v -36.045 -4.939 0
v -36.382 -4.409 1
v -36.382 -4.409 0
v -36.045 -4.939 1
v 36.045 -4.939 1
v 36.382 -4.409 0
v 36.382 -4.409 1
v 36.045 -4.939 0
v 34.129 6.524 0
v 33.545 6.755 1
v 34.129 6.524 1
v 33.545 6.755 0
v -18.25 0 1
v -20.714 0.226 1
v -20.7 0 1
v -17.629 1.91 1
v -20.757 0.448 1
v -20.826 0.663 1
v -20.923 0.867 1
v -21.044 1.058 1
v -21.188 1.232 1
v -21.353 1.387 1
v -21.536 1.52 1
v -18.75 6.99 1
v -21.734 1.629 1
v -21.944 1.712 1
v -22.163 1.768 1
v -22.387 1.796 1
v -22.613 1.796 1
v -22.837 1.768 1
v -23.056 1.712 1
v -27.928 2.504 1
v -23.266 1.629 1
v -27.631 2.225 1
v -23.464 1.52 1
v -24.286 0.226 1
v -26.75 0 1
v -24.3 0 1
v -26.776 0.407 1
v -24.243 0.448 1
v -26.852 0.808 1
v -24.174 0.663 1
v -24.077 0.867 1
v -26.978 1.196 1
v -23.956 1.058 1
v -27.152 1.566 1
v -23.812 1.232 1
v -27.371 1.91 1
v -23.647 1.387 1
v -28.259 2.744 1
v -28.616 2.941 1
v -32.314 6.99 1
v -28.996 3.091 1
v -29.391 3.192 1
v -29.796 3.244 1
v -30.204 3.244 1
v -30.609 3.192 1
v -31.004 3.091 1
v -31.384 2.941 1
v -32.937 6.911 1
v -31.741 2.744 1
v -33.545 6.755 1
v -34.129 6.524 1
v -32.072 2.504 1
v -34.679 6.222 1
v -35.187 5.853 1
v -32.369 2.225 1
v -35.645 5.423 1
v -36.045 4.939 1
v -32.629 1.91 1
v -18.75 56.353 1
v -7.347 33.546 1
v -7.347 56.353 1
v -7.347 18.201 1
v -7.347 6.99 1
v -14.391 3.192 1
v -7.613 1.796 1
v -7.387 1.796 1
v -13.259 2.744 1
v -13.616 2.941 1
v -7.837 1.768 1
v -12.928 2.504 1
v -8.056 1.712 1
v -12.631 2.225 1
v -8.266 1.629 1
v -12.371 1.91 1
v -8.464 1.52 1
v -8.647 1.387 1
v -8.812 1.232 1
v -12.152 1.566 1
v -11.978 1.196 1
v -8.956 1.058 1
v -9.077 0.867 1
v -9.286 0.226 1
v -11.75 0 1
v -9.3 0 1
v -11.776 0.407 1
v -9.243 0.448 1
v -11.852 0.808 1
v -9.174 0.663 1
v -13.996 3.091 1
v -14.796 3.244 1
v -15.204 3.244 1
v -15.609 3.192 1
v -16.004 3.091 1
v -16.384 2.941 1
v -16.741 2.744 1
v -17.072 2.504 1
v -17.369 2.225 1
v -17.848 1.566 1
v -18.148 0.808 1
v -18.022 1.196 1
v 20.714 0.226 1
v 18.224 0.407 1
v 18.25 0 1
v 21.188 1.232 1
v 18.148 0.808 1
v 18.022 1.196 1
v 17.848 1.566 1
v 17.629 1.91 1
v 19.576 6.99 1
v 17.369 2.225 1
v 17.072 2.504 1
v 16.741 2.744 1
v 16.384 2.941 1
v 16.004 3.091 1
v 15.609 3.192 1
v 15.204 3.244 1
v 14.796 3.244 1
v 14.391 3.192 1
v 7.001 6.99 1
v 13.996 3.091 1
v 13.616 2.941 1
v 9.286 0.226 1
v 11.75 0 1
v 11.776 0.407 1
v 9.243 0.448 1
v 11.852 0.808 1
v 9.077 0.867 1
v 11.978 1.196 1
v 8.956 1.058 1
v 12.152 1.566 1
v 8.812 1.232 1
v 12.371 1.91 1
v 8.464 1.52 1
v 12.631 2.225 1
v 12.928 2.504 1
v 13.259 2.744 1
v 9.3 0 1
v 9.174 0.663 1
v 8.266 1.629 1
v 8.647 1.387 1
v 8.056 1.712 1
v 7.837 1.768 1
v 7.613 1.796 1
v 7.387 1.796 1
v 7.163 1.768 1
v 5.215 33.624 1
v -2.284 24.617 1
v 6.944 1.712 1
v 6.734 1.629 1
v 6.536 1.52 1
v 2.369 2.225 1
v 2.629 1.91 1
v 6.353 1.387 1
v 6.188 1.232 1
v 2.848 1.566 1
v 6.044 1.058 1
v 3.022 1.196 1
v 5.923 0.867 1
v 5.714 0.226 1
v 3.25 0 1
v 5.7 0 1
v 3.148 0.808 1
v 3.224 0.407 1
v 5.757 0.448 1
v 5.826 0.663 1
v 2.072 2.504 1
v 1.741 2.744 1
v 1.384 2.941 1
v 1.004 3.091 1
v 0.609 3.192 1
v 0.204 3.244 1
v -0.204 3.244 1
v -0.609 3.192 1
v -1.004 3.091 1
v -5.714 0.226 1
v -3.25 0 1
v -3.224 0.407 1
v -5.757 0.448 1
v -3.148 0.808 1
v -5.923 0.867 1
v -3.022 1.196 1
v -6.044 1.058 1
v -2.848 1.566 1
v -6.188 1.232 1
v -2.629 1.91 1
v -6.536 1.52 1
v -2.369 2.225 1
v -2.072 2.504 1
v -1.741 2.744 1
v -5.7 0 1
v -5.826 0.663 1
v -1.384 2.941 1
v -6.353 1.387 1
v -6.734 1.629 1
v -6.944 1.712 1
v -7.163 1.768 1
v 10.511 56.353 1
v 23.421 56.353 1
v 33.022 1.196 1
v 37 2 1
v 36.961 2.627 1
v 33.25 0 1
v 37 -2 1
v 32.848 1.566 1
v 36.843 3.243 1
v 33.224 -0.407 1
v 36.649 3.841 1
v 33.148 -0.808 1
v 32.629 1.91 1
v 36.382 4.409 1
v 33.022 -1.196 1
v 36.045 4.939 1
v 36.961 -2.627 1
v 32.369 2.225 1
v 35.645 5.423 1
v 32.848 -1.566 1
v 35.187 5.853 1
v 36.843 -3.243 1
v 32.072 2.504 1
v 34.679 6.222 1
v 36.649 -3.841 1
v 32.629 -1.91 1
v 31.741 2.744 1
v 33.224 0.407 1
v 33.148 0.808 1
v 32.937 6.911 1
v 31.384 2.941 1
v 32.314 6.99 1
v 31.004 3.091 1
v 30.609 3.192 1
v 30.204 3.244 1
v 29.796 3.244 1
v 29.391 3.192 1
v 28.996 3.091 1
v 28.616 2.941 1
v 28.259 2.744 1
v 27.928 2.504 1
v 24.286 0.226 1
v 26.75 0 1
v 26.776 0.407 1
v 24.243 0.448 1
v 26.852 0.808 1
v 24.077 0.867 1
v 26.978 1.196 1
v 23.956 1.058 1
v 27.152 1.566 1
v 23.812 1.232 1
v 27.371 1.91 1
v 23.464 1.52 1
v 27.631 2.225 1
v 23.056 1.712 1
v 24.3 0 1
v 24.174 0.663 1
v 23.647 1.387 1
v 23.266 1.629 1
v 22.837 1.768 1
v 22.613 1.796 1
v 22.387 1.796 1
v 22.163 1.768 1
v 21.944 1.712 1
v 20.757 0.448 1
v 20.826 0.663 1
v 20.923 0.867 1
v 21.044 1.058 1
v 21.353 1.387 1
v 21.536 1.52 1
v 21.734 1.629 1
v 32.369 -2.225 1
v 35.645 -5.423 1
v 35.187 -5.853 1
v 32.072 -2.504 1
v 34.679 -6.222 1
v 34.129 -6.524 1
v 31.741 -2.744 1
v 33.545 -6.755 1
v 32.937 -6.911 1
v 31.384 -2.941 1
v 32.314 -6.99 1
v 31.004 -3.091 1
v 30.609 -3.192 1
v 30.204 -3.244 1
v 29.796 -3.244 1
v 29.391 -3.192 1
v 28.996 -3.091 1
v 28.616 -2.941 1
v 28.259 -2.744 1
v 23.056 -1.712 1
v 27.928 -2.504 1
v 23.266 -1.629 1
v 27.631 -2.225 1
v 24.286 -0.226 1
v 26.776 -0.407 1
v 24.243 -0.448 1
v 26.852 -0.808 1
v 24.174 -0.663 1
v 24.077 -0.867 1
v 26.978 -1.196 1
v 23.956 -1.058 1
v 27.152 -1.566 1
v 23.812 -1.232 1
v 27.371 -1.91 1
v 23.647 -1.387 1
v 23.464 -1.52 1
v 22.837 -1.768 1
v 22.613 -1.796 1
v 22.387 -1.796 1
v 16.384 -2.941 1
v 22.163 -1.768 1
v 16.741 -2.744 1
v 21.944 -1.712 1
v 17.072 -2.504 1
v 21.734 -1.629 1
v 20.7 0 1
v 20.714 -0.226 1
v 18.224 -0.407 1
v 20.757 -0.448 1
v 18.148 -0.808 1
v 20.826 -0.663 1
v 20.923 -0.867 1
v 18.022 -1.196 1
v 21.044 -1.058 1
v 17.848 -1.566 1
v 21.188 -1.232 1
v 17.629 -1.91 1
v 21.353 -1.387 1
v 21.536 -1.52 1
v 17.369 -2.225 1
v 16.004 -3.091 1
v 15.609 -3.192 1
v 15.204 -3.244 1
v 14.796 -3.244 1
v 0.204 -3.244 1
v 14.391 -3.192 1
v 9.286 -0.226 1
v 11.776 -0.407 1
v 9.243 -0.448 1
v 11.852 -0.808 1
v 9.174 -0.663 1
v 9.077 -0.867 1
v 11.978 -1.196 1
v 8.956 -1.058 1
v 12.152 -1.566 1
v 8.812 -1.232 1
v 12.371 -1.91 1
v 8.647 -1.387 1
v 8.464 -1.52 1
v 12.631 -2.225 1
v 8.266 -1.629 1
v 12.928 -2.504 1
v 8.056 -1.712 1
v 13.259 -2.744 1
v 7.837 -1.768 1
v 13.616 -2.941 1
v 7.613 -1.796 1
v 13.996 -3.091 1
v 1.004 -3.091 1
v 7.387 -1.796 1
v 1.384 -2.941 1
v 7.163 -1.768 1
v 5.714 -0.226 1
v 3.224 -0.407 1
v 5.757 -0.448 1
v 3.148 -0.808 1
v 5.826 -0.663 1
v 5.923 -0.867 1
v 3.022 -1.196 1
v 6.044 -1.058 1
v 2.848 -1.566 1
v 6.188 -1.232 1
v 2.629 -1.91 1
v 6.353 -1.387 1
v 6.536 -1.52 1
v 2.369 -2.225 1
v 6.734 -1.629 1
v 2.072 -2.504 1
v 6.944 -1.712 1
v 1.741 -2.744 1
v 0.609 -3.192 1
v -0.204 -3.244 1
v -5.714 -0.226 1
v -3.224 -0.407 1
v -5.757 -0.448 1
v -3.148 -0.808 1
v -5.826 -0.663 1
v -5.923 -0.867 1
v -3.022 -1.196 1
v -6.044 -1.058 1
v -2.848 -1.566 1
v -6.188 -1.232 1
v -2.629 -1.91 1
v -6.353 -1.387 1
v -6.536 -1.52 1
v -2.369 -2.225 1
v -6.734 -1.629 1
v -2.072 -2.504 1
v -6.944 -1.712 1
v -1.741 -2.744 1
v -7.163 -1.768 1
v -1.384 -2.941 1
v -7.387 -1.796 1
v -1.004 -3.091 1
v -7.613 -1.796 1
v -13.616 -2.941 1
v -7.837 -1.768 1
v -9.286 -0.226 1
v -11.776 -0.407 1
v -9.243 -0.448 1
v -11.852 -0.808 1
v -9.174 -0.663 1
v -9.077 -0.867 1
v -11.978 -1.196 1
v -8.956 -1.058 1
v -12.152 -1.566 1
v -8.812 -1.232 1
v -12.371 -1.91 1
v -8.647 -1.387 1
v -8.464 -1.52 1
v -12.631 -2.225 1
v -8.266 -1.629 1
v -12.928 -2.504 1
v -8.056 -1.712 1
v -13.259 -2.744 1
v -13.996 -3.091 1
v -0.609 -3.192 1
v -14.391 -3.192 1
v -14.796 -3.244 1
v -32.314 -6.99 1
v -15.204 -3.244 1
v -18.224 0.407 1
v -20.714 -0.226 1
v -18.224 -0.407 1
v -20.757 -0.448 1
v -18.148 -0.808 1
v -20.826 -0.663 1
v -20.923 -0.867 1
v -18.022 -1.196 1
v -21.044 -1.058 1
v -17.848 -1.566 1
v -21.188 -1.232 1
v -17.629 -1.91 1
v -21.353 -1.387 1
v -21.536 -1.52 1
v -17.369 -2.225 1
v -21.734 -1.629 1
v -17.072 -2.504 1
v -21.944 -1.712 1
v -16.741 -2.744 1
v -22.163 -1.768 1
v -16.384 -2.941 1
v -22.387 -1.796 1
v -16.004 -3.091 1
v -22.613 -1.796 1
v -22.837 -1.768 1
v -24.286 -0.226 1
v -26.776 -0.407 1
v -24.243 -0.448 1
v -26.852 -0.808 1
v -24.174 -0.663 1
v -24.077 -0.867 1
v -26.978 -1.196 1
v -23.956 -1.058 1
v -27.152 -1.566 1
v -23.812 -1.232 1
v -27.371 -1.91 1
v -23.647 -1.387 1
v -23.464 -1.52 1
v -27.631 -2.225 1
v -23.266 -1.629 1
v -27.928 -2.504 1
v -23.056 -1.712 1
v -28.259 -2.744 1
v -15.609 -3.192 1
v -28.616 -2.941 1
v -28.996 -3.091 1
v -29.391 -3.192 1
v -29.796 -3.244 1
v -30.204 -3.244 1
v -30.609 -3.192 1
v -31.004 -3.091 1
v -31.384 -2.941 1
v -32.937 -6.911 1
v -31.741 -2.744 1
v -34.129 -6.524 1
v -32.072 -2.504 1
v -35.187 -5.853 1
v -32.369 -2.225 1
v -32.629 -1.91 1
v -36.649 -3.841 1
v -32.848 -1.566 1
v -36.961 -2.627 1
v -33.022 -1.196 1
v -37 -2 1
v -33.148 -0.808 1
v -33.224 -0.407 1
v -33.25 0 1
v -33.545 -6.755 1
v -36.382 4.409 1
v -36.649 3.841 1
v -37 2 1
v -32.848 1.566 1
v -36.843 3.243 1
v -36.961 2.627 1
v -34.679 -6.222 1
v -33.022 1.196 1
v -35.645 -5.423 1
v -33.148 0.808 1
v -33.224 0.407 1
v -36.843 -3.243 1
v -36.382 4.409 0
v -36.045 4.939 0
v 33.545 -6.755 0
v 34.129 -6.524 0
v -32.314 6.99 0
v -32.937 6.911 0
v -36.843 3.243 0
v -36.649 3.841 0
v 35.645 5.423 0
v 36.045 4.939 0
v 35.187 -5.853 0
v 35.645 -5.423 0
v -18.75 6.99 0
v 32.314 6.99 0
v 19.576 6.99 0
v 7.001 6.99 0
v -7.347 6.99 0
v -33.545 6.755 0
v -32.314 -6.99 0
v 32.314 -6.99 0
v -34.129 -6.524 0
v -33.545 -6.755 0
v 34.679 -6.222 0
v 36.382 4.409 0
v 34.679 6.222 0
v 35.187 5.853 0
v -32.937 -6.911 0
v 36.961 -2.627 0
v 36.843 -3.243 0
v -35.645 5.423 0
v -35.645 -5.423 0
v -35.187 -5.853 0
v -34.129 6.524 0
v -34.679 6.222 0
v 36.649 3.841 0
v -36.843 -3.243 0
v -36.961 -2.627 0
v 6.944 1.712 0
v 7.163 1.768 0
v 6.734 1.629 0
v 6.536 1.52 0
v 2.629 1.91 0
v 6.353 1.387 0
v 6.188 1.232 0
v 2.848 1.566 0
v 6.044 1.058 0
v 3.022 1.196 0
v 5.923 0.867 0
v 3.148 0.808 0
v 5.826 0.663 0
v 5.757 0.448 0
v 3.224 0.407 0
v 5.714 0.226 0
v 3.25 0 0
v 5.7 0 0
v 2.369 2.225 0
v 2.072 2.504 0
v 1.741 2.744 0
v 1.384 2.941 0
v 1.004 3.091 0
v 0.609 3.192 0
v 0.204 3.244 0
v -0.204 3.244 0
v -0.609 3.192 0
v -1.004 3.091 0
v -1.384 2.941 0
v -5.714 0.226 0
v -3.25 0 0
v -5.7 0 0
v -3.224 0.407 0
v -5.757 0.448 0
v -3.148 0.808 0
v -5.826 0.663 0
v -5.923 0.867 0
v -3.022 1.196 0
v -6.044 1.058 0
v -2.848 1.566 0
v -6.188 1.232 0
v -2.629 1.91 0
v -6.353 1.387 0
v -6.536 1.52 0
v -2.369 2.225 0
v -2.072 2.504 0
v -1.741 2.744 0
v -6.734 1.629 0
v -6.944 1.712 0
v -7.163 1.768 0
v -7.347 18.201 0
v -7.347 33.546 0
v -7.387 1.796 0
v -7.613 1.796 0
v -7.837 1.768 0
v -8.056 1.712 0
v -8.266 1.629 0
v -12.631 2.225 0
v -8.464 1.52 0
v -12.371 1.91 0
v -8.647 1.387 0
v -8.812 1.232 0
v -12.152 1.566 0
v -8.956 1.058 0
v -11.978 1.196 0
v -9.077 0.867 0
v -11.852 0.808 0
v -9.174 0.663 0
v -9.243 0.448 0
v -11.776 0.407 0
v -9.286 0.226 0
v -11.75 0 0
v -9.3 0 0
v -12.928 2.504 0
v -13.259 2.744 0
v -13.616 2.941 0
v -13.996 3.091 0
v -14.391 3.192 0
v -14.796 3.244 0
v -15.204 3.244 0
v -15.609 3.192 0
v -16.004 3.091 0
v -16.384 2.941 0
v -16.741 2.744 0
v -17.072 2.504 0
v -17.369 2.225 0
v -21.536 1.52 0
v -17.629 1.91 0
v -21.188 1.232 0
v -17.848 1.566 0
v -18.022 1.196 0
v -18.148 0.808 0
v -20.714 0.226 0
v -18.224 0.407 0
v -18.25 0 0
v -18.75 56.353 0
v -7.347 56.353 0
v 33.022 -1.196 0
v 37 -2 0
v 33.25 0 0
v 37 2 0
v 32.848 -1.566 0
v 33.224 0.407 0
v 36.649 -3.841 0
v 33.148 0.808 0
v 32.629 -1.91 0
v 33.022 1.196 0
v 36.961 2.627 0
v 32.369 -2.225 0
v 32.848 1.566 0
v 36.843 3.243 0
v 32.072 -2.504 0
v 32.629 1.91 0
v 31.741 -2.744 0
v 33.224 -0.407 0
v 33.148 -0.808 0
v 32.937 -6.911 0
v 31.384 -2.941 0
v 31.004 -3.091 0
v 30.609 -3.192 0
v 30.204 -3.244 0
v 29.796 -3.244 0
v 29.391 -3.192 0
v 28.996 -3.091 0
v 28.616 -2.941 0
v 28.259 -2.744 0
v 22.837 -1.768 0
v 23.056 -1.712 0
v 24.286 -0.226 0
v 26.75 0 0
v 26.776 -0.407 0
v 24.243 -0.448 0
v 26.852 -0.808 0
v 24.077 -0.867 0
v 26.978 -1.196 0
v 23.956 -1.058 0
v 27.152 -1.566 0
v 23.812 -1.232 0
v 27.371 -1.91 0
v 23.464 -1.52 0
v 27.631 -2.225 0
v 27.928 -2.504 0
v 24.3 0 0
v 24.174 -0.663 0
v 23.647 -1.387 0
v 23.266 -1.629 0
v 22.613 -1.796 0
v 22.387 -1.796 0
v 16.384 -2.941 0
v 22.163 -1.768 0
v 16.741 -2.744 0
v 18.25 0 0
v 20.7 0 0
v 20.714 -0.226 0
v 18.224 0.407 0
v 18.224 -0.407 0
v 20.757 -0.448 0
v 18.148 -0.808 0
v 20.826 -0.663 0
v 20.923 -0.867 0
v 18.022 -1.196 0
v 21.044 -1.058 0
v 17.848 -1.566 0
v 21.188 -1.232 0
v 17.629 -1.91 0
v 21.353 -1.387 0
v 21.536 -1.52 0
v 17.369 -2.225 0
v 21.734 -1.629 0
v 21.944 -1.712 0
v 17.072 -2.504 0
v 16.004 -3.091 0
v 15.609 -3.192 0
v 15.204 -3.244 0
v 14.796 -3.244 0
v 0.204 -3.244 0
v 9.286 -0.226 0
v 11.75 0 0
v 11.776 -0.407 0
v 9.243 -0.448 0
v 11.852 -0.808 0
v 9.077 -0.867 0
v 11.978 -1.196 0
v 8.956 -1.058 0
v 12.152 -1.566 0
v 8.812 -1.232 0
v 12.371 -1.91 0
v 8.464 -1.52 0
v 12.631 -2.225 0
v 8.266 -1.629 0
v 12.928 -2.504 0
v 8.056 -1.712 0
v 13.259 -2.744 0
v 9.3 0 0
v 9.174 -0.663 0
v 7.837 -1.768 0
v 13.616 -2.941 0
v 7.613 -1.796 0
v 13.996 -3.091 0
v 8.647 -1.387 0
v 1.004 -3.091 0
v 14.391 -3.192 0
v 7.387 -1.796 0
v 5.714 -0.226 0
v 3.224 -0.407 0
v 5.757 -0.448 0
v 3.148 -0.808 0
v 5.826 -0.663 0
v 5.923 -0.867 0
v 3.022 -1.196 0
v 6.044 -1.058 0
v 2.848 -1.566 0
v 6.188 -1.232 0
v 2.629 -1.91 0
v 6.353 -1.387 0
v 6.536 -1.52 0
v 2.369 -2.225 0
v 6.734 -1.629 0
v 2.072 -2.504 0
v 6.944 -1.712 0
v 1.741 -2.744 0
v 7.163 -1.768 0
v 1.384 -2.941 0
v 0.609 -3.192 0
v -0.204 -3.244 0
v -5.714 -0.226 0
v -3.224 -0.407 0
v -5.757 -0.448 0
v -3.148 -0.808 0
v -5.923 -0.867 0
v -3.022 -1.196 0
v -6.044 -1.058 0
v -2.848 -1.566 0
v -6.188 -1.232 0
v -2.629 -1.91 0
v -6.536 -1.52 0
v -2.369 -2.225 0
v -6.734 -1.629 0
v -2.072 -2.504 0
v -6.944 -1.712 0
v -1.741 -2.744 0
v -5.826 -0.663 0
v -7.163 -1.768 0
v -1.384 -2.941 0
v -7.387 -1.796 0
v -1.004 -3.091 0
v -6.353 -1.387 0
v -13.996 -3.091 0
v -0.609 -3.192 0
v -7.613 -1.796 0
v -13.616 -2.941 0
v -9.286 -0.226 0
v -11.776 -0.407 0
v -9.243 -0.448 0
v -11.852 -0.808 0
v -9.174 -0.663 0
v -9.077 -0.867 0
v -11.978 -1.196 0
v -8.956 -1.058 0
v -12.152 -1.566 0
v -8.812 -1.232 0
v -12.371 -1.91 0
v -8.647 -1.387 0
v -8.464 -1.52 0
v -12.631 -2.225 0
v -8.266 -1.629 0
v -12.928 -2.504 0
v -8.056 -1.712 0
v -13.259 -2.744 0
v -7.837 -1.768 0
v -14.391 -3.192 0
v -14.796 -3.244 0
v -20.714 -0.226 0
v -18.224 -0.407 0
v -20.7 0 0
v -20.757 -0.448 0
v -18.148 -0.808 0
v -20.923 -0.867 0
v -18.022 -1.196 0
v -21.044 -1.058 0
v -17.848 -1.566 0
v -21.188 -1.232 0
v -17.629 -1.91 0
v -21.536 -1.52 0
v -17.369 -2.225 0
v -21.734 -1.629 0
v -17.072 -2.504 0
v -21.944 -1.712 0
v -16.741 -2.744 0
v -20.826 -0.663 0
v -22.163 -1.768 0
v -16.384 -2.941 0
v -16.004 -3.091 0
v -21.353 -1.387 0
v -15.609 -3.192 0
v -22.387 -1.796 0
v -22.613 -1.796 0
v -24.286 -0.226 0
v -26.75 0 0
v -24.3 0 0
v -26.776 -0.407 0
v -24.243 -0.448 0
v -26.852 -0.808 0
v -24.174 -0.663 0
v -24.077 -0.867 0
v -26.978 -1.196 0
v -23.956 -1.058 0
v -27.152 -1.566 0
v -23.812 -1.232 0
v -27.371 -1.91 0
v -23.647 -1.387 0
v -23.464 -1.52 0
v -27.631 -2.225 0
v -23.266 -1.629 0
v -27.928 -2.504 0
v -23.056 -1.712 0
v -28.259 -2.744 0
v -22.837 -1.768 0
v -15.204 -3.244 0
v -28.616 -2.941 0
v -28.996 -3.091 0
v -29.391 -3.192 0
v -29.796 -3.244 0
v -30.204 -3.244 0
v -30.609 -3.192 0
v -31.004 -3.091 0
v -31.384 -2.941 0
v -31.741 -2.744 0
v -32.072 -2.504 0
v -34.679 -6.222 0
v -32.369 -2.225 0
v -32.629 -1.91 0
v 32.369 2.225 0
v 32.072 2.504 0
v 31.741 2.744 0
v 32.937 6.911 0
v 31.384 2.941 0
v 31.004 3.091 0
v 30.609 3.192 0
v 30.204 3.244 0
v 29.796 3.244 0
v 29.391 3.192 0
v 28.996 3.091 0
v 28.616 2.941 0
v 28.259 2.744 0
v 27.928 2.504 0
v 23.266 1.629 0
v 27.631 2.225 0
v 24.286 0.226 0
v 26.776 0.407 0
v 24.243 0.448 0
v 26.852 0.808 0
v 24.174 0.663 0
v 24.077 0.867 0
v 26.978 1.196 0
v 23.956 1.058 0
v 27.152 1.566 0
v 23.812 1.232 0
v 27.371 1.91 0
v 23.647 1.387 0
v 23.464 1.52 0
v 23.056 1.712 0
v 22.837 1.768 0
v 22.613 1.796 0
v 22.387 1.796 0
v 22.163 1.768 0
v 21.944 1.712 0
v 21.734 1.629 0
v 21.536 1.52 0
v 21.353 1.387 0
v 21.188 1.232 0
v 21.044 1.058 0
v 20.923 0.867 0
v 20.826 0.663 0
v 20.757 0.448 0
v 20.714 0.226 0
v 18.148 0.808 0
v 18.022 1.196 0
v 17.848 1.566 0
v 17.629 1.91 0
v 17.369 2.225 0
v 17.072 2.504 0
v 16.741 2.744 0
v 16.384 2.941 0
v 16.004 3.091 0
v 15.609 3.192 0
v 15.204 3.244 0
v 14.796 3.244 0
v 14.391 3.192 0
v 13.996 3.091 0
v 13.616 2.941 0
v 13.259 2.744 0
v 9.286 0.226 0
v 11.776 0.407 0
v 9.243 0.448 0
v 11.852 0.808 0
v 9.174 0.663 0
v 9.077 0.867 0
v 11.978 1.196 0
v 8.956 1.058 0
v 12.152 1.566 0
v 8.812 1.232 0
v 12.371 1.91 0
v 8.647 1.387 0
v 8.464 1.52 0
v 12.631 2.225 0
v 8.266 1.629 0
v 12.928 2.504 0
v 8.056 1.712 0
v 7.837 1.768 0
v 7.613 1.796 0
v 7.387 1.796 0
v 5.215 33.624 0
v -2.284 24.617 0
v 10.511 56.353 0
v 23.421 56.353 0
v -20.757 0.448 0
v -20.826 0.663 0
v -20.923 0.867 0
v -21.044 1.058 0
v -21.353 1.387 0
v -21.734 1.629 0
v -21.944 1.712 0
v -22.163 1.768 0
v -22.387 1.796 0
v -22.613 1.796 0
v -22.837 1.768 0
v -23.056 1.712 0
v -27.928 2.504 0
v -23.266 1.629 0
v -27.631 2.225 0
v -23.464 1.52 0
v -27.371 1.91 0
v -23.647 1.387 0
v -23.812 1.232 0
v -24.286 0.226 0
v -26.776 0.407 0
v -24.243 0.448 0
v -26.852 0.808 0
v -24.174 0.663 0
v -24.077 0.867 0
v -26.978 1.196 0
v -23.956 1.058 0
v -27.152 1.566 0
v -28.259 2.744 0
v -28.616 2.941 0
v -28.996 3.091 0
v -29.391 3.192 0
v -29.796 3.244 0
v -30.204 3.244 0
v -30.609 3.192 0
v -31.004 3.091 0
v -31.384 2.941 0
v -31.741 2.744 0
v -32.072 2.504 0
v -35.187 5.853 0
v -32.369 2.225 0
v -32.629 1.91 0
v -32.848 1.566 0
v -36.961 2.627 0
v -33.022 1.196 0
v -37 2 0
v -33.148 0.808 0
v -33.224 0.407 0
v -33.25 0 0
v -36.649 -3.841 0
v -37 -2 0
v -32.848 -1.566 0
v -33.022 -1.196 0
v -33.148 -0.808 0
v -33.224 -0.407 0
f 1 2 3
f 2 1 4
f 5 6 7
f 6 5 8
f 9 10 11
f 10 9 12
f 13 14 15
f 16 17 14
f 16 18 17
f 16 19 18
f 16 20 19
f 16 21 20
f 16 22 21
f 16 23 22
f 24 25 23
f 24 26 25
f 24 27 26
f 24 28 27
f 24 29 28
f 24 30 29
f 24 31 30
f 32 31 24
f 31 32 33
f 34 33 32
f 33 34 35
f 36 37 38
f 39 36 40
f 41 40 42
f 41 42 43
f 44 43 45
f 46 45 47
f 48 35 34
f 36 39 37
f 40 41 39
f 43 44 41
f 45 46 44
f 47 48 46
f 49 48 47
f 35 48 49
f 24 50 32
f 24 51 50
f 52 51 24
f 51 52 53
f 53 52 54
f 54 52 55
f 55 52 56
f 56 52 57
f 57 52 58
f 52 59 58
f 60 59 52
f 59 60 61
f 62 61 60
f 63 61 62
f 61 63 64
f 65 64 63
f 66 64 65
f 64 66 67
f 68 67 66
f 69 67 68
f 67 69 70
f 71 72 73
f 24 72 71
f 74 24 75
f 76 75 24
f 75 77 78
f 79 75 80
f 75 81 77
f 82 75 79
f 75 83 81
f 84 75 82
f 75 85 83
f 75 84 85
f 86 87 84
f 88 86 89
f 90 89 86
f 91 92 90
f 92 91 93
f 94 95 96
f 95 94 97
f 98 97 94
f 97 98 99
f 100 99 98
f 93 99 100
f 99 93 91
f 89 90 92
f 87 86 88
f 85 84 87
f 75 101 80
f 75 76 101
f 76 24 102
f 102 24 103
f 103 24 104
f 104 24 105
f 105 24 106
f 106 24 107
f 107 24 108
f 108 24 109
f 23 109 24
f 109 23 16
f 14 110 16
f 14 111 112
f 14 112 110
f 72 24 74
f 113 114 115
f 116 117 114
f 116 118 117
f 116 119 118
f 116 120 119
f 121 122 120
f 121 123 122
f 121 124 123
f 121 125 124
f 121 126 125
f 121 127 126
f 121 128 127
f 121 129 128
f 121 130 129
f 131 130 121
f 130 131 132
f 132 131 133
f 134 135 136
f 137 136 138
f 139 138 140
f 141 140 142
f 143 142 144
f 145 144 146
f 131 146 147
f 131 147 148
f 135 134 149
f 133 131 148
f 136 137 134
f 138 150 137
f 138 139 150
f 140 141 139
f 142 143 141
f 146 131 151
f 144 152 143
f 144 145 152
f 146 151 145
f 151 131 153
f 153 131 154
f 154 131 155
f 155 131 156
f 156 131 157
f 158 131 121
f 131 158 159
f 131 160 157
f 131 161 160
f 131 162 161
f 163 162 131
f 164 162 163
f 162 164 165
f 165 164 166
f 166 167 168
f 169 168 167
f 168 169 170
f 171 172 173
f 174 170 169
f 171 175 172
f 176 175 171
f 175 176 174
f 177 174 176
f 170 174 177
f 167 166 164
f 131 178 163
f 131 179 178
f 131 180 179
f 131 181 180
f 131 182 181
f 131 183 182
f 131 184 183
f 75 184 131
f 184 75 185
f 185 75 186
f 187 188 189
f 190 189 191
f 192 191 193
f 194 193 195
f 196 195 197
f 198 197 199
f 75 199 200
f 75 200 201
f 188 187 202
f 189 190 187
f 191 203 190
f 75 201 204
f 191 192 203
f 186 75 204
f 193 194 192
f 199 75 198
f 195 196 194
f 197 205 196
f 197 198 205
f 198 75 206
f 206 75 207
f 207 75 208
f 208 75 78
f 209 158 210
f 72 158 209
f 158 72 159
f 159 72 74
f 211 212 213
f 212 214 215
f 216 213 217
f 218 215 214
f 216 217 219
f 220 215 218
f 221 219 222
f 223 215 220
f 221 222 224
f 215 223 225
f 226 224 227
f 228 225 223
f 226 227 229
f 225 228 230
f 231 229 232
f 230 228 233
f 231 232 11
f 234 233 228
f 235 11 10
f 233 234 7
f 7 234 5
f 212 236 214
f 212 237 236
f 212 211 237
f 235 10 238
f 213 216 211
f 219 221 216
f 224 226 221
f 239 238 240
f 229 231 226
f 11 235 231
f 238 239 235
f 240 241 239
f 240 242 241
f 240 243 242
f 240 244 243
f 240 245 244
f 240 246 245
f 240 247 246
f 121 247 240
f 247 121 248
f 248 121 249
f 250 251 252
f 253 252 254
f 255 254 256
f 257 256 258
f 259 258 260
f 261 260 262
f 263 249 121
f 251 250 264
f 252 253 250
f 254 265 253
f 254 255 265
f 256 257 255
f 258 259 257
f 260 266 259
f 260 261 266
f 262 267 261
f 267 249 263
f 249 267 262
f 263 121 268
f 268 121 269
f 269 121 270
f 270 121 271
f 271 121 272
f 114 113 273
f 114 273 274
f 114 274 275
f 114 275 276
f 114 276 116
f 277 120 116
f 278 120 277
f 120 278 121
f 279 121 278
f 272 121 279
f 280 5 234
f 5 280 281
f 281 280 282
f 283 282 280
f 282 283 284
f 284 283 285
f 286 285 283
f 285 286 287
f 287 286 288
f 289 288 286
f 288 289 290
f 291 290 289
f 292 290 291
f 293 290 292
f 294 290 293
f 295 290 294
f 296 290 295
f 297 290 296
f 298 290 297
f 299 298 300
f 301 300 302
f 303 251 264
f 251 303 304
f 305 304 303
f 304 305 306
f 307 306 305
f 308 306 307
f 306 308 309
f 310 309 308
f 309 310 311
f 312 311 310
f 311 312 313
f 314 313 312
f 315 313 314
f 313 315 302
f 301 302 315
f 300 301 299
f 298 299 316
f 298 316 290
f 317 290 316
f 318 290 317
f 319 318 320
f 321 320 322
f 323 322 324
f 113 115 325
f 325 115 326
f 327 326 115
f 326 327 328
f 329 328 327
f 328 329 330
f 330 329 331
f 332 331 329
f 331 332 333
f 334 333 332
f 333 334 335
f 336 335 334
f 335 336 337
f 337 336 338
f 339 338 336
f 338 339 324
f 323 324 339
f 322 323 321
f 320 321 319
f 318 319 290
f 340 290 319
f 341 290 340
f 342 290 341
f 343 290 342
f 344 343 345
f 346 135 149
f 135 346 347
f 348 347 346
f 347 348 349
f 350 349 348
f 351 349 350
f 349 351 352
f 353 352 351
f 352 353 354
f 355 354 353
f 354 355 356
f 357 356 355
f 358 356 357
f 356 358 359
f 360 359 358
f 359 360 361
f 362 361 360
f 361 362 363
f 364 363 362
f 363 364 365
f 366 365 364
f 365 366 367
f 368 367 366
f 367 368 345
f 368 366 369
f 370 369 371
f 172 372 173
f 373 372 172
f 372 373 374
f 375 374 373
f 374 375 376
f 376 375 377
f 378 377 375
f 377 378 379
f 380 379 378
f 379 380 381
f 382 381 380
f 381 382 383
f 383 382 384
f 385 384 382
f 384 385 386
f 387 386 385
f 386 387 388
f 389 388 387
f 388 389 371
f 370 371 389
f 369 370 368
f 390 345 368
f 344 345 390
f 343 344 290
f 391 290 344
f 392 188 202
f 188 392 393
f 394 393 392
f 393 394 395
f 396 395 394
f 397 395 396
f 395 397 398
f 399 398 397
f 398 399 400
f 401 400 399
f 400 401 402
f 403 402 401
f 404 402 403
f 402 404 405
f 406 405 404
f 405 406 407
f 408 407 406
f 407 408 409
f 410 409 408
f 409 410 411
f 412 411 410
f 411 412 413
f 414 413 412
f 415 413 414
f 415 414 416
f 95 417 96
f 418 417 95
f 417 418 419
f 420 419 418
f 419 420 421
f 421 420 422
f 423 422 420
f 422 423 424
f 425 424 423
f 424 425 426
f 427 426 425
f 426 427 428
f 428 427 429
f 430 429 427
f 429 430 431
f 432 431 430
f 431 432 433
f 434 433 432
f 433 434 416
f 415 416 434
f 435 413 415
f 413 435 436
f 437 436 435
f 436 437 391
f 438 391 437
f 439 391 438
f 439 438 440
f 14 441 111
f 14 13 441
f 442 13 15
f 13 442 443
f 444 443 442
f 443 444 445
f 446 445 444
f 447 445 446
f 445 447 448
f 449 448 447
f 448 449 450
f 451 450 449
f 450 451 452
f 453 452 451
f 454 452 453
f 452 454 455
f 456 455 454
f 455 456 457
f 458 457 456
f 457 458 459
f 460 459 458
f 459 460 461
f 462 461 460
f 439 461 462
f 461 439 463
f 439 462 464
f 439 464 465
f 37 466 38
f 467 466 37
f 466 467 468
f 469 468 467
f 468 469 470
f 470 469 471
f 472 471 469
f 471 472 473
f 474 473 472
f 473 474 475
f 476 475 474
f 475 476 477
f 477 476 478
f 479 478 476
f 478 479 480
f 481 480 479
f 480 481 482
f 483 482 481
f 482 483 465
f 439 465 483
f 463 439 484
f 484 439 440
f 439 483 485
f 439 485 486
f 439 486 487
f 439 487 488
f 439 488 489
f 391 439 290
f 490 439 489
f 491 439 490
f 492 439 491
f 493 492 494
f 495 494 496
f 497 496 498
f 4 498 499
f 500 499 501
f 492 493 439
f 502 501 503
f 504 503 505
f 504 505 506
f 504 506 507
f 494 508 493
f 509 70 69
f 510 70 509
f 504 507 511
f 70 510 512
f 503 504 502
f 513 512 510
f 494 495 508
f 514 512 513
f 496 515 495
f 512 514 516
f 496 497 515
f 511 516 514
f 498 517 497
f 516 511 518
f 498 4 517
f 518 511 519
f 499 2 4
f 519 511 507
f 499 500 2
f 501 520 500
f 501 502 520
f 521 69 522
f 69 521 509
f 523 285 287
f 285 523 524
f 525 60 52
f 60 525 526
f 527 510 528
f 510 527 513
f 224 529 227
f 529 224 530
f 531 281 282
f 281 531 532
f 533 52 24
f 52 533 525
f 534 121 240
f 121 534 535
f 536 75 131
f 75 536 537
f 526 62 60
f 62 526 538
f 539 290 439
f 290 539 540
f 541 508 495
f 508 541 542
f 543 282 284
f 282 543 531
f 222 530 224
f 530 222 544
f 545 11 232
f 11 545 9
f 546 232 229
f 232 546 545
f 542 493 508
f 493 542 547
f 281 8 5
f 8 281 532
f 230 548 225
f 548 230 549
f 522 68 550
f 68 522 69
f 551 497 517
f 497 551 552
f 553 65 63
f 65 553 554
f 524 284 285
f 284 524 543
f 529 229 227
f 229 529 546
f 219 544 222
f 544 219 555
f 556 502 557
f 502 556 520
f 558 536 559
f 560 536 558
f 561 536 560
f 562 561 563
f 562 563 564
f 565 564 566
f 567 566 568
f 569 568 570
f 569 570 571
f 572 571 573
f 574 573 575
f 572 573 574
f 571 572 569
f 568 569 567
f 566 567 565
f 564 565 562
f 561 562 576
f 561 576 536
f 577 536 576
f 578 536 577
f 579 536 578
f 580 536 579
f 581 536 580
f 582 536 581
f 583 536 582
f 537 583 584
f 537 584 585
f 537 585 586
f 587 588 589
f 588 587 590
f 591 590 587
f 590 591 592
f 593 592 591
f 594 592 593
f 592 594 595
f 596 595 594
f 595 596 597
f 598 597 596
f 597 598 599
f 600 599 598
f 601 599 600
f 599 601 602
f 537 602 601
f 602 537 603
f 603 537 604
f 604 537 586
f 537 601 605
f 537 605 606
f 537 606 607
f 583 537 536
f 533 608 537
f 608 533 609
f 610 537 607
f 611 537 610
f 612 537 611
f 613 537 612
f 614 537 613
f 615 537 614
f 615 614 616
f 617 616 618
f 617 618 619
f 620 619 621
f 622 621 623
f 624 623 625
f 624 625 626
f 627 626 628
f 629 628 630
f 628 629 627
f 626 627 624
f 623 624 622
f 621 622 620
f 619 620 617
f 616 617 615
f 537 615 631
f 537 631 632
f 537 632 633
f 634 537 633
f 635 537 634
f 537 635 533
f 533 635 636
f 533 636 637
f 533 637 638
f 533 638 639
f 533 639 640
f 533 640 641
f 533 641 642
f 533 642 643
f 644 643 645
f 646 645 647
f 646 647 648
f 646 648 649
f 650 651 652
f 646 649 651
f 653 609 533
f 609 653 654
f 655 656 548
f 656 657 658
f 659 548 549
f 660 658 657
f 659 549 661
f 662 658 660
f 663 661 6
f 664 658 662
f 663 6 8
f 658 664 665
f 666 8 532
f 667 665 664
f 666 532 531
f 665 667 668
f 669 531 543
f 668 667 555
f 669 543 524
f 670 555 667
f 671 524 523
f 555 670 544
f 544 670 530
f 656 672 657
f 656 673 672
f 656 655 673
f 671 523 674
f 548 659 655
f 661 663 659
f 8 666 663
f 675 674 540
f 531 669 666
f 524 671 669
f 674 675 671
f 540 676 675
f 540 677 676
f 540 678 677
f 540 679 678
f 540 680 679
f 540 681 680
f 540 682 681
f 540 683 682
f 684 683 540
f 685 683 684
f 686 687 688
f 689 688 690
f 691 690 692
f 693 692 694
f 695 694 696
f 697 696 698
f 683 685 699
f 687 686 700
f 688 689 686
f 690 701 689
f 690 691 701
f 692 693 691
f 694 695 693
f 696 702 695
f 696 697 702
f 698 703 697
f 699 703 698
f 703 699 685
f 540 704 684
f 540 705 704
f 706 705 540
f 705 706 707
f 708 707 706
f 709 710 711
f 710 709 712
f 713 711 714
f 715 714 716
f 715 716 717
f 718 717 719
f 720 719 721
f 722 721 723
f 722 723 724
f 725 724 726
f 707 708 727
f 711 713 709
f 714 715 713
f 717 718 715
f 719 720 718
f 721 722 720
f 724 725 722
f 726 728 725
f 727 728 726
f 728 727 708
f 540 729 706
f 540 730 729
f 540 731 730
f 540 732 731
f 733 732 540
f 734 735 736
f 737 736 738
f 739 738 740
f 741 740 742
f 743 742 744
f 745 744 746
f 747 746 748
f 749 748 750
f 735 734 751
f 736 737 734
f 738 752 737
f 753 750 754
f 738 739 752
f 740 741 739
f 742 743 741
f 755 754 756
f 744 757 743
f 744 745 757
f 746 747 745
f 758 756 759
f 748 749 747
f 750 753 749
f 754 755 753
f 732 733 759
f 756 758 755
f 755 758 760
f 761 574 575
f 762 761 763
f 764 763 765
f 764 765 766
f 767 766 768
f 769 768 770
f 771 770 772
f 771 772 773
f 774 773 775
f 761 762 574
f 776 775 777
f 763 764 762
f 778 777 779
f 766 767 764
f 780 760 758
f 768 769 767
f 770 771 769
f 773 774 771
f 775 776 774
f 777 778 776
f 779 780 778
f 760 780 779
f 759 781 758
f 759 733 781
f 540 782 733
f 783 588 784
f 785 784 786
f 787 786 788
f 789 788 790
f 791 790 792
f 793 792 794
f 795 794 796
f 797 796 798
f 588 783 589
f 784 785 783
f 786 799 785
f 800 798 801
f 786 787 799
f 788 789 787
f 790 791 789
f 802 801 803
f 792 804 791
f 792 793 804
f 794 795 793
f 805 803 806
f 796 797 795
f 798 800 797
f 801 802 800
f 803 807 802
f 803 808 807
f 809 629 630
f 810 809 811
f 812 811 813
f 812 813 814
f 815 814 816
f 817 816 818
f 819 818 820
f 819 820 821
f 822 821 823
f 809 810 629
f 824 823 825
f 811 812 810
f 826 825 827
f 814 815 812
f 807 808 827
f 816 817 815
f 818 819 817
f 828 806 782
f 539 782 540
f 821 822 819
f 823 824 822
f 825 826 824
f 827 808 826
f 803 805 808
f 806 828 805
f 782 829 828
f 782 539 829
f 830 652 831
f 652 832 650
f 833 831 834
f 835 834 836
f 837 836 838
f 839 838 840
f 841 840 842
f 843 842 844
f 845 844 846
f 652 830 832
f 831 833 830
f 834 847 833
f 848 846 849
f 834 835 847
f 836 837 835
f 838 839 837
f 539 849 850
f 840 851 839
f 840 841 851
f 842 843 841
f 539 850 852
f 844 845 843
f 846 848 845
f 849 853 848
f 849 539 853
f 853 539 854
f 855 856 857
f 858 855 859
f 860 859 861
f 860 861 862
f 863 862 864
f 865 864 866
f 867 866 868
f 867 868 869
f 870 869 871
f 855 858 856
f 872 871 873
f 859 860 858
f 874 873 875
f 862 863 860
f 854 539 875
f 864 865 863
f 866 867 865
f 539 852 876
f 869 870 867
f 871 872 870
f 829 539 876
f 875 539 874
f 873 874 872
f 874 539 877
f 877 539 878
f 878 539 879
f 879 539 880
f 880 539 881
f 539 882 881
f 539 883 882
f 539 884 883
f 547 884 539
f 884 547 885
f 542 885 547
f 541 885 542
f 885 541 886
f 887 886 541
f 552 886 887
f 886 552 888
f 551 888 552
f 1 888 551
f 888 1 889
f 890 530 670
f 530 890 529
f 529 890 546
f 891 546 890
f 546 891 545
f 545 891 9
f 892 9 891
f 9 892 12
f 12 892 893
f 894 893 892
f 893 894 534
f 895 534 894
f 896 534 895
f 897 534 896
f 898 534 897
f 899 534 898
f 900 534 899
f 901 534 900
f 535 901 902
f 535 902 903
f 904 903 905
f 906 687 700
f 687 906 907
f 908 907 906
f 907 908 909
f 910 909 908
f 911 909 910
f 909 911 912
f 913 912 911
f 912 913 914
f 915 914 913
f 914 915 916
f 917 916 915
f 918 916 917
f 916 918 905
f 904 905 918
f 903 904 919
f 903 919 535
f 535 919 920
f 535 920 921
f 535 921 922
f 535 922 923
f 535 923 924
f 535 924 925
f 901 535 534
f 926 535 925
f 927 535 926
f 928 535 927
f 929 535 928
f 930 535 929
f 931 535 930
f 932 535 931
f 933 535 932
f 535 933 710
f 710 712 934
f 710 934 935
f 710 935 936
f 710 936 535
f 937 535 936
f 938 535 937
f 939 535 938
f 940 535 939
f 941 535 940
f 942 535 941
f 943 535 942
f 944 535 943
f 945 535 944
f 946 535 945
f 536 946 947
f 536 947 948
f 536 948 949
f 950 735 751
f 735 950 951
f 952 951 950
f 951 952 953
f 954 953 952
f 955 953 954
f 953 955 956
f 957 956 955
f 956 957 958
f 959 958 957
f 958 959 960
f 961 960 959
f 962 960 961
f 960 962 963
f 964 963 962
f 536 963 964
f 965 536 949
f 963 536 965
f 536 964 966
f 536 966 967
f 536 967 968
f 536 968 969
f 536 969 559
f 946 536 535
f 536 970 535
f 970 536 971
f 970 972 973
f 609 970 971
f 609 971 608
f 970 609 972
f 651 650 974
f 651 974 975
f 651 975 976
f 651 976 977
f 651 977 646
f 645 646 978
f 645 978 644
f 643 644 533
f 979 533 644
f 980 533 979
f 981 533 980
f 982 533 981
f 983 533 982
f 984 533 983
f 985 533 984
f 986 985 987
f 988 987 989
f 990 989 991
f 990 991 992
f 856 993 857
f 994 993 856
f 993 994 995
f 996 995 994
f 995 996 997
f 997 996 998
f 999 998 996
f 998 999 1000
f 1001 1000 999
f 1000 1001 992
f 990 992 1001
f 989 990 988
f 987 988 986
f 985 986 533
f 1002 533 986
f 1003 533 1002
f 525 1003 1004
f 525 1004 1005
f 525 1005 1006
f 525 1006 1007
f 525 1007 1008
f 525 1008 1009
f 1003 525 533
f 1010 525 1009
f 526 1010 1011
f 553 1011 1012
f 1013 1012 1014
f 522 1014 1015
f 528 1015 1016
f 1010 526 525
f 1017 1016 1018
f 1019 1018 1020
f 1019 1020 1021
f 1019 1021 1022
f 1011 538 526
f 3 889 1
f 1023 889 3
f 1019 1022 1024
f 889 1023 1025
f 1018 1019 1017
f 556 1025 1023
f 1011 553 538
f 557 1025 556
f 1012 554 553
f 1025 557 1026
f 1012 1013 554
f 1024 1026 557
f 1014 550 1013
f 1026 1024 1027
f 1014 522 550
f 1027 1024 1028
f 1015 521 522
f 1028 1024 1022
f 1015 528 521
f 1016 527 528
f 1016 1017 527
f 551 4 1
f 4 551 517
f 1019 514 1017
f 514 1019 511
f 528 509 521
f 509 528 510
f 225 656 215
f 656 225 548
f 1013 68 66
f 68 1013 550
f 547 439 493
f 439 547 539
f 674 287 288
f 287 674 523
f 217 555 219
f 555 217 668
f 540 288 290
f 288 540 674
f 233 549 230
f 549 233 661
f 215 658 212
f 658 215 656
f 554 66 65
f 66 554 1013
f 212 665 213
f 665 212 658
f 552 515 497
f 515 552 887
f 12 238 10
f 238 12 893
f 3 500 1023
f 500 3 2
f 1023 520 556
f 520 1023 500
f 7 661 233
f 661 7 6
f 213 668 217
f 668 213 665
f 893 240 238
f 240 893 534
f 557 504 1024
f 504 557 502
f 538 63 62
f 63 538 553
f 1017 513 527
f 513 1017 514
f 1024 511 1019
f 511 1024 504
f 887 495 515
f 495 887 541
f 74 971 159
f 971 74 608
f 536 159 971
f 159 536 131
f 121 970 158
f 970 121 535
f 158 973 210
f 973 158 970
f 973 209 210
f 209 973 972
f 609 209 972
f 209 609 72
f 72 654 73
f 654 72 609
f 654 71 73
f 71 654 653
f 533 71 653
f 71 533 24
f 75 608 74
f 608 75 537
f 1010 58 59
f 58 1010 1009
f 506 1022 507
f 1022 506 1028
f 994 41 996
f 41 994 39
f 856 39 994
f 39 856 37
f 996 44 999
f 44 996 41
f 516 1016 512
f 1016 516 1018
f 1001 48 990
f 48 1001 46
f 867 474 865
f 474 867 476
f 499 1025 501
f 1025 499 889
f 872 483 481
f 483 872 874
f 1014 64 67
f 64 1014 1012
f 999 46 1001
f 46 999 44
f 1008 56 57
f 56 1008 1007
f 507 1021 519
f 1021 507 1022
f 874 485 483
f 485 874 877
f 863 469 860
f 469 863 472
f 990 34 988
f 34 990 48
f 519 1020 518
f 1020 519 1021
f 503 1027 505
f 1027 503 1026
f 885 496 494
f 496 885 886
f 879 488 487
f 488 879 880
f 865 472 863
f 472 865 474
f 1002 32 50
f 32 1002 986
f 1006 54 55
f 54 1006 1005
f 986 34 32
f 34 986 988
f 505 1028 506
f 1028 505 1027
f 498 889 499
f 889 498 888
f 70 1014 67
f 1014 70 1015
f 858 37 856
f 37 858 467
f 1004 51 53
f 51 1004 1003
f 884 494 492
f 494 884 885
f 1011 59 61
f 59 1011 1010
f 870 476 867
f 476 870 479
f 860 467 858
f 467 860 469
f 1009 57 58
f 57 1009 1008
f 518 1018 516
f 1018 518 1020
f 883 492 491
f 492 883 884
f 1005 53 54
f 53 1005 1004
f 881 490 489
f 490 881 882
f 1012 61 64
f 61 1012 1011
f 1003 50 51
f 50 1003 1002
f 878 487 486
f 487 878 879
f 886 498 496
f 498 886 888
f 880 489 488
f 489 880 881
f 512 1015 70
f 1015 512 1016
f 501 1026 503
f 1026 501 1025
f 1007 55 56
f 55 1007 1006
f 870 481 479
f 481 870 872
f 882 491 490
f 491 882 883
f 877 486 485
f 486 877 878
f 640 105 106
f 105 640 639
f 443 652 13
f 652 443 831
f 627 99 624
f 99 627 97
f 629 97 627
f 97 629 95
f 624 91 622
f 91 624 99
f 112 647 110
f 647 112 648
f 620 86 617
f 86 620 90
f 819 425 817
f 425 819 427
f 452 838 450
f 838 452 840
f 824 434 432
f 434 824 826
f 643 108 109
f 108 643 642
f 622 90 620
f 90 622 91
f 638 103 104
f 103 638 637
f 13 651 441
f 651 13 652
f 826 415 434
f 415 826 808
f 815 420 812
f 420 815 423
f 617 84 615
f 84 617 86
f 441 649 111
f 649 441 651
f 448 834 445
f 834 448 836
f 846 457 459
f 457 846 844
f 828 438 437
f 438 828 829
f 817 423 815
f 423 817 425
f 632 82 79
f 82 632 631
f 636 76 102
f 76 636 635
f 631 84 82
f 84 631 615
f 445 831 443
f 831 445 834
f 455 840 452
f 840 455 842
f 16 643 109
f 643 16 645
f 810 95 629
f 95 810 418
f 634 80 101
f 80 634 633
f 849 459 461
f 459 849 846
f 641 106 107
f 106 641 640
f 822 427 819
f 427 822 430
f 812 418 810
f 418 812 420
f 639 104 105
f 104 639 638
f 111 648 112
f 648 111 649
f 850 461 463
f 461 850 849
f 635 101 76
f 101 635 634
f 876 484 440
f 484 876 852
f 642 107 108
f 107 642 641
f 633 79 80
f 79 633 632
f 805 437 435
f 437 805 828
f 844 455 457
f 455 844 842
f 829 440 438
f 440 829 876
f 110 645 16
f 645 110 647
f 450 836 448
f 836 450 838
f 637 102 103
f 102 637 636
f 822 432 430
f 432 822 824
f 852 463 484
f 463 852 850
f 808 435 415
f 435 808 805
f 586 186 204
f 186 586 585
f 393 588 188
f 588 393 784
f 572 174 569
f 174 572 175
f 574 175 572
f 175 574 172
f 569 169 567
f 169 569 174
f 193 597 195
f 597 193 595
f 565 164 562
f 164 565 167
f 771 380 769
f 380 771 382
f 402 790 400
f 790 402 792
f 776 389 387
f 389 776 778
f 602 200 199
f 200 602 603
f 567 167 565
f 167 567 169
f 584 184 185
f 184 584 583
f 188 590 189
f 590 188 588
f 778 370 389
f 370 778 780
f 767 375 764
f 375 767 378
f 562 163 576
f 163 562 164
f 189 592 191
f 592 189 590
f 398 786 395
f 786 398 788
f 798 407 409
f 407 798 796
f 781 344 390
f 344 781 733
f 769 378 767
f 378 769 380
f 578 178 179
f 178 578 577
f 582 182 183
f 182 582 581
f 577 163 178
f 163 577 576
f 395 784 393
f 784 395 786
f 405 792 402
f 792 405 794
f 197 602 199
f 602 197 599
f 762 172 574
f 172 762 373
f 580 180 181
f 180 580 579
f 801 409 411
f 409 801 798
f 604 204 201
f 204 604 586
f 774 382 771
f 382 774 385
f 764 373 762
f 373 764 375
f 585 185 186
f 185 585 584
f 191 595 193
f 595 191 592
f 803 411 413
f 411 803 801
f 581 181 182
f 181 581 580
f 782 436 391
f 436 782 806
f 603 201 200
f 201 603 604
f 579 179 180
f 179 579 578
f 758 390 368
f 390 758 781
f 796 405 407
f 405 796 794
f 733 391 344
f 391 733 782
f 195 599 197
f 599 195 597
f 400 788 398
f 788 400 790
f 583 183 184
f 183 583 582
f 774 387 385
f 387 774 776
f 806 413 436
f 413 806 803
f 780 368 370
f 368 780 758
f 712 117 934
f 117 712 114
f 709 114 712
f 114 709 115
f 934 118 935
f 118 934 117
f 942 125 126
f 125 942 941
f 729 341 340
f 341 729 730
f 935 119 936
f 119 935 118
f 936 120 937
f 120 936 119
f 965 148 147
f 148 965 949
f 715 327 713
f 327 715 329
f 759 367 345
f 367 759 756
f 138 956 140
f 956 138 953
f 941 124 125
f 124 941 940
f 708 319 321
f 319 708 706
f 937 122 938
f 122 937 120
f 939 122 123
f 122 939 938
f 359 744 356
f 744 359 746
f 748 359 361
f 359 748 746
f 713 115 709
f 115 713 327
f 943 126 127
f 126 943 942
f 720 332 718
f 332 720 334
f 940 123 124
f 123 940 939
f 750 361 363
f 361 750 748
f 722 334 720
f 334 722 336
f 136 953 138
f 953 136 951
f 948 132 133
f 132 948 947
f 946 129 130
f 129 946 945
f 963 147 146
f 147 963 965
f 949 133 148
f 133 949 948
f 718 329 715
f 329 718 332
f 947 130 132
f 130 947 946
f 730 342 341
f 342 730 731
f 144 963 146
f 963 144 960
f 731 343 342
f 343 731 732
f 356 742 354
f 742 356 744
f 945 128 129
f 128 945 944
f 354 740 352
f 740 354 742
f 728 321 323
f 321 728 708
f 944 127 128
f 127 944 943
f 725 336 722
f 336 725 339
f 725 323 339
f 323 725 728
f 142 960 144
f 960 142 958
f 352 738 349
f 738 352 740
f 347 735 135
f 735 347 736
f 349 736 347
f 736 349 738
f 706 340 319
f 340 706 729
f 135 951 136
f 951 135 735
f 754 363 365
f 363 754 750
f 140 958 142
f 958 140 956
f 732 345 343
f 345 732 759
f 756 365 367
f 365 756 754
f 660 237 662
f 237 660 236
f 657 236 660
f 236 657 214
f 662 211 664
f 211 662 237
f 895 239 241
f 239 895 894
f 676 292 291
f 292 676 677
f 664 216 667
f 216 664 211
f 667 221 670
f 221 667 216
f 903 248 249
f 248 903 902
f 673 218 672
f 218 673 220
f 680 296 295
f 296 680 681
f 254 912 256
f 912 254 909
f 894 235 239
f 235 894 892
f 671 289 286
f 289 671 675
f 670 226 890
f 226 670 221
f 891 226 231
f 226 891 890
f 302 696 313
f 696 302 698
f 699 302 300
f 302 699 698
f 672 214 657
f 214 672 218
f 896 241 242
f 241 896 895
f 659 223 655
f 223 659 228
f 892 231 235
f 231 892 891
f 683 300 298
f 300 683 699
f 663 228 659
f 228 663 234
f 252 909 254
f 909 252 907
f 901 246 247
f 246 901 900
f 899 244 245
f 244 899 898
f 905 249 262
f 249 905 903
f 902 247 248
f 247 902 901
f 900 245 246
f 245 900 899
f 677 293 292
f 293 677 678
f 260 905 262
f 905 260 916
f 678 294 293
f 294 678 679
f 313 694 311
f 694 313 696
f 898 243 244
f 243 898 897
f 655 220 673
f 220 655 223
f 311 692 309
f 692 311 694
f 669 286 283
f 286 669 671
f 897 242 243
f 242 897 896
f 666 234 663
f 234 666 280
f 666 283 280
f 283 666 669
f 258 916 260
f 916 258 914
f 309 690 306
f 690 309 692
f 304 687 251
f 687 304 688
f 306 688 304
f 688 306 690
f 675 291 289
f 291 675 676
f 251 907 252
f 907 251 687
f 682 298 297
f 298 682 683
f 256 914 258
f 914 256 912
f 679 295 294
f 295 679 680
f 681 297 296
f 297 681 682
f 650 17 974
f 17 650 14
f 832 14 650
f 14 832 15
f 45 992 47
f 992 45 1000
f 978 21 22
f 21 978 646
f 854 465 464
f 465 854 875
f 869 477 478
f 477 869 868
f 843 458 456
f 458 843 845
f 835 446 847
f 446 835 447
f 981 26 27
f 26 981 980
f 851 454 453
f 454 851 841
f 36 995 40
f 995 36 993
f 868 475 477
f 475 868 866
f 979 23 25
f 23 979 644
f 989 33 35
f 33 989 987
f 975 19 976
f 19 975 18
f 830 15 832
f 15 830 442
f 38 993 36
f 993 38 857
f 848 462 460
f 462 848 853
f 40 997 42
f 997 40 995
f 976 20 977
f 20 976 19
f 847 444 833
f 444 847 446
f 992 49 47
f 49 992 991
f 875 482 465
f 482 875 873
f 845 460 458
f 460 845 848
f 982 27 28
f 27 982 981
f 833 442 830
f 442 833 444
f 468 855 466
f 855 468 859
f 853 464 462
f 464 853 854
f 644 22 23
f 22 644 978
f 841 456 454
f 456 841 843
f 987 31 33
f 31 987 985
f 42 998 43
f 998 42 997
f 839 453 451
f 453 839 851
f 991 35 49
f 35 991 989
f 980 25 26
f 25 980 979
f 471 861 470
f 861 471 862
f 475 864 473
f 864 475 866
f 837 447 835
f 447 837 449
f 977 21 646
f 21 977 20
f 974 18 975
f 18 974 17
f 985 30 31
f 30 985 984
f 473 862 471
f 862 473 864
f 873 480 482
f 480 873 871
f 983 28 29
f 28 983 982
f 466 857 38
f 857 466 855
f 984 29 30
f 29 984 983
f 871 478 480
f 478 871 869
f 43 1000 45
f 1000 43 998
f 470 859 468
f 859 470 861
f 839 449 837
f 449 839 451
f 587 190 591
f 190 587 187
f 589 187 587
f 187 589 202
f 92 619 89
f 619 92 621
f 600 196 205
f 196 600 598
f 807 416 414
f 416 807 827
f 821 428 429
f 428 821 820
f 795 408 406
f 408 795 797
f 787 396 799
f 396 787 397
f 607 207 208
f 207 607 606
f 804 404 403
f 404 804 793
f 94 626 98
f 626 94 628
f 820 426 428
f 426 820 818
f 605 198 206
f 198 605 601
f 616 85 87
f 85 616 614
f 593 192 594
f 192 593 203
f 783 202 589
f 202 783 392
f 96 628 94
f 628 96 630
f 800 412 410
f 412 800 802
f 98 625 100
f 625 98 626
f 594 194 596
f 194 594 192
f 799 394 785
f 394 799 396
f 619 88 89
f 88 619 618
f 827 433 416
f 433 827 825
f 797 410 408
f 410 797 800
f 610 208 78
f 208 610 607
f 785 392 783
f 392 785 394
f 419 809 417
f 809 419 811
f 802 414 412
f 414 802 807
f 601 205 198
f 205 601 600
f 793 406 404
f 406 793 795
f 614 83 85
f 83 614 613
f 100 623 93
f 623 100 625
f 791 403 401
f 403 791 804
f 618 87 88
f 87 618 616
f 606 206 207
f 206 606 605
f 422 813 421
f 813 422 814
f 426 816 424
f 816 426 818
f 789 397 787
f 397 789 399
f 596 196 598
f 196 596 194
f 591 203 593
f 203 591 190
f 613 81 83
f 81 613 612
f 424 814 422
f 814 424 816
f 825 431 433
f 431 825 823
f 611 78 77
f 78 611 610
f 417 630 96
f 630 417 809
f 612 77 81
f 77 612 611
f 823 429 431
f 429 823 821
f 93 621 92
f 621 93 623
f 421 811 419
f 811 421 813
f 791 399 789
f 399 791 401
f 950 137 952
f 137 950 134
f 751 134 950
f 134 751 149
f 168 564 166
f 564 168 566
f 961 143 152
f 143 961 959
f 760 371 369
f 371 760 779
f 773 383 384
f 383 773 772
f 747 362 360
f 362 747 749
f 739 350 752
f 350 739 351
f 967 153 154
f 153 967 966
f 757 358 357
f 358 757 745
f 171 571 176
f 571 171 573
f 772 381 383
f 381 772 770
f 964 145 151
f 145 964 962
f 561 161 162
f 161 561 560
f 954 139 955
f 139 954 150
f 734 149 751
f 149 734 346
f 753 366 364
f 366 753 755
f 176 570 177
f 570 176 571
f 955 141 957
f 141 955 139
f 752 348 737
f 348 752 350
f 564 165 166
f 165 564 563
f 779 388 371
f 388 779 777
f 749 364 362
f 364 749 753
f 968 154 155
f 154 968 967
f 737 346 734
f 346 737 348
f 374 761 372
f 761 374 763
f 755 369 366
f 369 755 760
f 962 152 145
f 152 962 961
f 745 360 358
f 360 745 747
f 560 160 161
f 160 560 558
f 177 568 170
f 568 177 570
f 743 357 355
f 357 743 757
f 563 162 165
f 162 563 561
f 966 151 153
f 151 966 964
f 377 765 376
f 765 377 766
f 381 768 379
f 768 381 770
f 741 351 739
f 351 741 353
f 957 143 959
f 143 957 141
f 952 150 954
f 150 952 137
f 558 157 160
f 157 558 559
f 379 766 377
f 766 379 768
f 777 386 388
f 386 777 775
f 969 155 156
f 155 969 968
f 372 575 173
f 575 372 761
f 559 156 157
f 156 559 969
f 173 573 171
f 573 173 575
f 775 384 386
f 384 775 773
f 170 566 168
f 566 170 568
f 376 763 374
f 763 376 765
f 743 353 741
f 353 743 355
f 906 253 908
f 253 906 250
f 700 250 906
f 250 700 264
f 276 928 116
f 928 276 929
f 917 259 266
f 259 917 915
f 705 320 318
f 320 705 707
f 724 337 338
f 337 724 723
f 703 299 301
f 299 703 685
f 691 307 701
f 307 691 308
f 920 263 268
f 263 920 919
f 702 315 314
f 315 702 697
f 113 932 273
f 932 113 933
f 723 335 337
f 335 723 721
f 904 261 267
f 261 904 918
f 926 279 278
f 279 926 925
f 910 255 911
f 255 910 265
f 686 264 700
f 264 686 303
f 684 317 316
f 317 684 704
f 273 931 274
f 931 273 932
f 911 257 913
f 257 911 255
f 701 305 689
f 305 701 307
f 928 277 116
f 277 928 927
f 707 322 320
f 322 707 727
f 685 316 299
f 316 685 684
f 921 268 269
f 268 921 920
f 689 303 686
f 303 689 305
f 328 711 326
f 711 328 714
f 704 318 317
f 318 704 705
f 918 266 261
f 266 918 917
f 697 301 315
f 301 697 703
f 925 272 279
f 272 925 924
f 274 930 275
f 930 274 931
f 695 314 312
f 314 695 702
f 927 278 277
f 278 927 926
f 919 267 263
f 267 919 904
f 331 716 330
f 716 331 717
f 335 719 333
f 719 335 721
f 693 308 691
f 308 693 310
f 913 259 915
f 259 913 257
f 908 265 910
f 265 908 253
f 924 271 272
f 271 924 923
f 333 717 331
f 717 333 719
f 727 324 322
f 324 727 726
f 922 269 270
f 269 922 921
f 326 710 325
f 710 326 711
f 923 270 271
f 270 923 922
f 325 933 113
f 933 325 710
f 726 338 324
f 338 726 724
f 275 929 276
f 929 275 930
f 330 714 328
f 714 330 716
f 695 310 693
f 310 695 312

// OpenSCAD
$fn = 50;


difference() {
	union() {
		hull() {
			translate(v = [-32.0000000000, 2.0000000000, 0]) {
				cylinder(h = 1, r = 5);
			}
			translate(v = [32.0000000000, 2.0000000000, 0]) {
				cylinder(h = 1, r = 5);
			}
			translate(v = [-32.0000000000, -2.0000000000, 0]) {
				cylinder(h = 1, r = 5);
			}
			translate(v = [32.0000000000, -2.0000000000, 0]) {
				cylinder(h = 1, r = 5);
			}
		}
		translate(v = [0, 55, 0]) {
			linear_extrude(height = 1) {
				text(font = "DejaVu Sans Mono:style=Bold", halign = "center", size = 57.0000000000, text = "K", valign = "top");
			}
		}
	}
	union() {
		translate(v = [-30.0000000000, 0.0000000000, 0]) {
			translate(v = [0, 0, -100]) {
				cylinder(h = 200, r = 3.2500000000);
			}
		}
		translate(v = [-15.0000000000, 0.0000000000, 0]) {
			translate(v = [0, 0, -100]) {
				cylinder(h = 200, r = 3.2500000000);
			}
		}
		translate(v = [0, 0, -100]) {
			cylinder(h = 200, r = 3.2500000000);
		}
		translate(v = [15.0000000000, 0.0000000000, 0]) {
			translate(v = [0, 0, -100]) {
				cylinder(h = 200, r = 3.2500000000);
			}
		}
		translate(v = [30.0000000000, 0.0000000000, 0]) {
			translate(v = [0, 0, -100]) {
				cylinder(h = 200, r = 3.2500000000);
			}
		}
		translate(v = [-30.0000000000, 0.0000000000, 0]) {
			translate(v = [0, 0, -100]) {
				cylinder(h = 200, r = 1.8000000000);
			}
		}
		translate(v = [-22.5000000000, 0.0000000000, 0]) {
			translate(v = [0, 0, -100]) {
				cylinder(h = 200, r = 1.8000000000);
			}
		}
		translate(v = [-15.0000000000, 0.0000000000, 0]) {
			translate(v = [0, 0, -100]) {
				cylinder(h = 200, r = 1.8000000000);
			}
		}
		translate(v = [-7.5000000000, 0.0000000000, 0]) {
			translate(v = [0, 0, -100]) {
				cylinder(h = 200, r = 1.8000000000);
			}
		}
		translate(v = [0, 0, -100]) {
			cylinder(h = 200, r = 1.8000000000);
		}
		translate(v = [7.5000000000, 0.0000000000, 0]) {
			translate(v = [0, 0, -100]) {
				cylinder(h = 200, r = 1.8000000000);
			}
		}
		translate(v = [15.0000000000, 0.0000000000, 0]) {
			translate(v = [0, 0, -100]) {
				cylinder(h = 200, r = 1.8000000000);
			}
		}
		translate(v = [22.5000000000, 0.0000000000, 0]) {
			translate(v = [0, 0, -100]) {
				cylinder(h = 200, r = 1.8000000000);
			}
		}
		translate(v = [30.0000000000, 0.0000000000, 0]) {
			translate(v = [0, 0, -100]) {
				cylinder(h = 200, r = 1.8000000000);
			}
		}
	}
}
